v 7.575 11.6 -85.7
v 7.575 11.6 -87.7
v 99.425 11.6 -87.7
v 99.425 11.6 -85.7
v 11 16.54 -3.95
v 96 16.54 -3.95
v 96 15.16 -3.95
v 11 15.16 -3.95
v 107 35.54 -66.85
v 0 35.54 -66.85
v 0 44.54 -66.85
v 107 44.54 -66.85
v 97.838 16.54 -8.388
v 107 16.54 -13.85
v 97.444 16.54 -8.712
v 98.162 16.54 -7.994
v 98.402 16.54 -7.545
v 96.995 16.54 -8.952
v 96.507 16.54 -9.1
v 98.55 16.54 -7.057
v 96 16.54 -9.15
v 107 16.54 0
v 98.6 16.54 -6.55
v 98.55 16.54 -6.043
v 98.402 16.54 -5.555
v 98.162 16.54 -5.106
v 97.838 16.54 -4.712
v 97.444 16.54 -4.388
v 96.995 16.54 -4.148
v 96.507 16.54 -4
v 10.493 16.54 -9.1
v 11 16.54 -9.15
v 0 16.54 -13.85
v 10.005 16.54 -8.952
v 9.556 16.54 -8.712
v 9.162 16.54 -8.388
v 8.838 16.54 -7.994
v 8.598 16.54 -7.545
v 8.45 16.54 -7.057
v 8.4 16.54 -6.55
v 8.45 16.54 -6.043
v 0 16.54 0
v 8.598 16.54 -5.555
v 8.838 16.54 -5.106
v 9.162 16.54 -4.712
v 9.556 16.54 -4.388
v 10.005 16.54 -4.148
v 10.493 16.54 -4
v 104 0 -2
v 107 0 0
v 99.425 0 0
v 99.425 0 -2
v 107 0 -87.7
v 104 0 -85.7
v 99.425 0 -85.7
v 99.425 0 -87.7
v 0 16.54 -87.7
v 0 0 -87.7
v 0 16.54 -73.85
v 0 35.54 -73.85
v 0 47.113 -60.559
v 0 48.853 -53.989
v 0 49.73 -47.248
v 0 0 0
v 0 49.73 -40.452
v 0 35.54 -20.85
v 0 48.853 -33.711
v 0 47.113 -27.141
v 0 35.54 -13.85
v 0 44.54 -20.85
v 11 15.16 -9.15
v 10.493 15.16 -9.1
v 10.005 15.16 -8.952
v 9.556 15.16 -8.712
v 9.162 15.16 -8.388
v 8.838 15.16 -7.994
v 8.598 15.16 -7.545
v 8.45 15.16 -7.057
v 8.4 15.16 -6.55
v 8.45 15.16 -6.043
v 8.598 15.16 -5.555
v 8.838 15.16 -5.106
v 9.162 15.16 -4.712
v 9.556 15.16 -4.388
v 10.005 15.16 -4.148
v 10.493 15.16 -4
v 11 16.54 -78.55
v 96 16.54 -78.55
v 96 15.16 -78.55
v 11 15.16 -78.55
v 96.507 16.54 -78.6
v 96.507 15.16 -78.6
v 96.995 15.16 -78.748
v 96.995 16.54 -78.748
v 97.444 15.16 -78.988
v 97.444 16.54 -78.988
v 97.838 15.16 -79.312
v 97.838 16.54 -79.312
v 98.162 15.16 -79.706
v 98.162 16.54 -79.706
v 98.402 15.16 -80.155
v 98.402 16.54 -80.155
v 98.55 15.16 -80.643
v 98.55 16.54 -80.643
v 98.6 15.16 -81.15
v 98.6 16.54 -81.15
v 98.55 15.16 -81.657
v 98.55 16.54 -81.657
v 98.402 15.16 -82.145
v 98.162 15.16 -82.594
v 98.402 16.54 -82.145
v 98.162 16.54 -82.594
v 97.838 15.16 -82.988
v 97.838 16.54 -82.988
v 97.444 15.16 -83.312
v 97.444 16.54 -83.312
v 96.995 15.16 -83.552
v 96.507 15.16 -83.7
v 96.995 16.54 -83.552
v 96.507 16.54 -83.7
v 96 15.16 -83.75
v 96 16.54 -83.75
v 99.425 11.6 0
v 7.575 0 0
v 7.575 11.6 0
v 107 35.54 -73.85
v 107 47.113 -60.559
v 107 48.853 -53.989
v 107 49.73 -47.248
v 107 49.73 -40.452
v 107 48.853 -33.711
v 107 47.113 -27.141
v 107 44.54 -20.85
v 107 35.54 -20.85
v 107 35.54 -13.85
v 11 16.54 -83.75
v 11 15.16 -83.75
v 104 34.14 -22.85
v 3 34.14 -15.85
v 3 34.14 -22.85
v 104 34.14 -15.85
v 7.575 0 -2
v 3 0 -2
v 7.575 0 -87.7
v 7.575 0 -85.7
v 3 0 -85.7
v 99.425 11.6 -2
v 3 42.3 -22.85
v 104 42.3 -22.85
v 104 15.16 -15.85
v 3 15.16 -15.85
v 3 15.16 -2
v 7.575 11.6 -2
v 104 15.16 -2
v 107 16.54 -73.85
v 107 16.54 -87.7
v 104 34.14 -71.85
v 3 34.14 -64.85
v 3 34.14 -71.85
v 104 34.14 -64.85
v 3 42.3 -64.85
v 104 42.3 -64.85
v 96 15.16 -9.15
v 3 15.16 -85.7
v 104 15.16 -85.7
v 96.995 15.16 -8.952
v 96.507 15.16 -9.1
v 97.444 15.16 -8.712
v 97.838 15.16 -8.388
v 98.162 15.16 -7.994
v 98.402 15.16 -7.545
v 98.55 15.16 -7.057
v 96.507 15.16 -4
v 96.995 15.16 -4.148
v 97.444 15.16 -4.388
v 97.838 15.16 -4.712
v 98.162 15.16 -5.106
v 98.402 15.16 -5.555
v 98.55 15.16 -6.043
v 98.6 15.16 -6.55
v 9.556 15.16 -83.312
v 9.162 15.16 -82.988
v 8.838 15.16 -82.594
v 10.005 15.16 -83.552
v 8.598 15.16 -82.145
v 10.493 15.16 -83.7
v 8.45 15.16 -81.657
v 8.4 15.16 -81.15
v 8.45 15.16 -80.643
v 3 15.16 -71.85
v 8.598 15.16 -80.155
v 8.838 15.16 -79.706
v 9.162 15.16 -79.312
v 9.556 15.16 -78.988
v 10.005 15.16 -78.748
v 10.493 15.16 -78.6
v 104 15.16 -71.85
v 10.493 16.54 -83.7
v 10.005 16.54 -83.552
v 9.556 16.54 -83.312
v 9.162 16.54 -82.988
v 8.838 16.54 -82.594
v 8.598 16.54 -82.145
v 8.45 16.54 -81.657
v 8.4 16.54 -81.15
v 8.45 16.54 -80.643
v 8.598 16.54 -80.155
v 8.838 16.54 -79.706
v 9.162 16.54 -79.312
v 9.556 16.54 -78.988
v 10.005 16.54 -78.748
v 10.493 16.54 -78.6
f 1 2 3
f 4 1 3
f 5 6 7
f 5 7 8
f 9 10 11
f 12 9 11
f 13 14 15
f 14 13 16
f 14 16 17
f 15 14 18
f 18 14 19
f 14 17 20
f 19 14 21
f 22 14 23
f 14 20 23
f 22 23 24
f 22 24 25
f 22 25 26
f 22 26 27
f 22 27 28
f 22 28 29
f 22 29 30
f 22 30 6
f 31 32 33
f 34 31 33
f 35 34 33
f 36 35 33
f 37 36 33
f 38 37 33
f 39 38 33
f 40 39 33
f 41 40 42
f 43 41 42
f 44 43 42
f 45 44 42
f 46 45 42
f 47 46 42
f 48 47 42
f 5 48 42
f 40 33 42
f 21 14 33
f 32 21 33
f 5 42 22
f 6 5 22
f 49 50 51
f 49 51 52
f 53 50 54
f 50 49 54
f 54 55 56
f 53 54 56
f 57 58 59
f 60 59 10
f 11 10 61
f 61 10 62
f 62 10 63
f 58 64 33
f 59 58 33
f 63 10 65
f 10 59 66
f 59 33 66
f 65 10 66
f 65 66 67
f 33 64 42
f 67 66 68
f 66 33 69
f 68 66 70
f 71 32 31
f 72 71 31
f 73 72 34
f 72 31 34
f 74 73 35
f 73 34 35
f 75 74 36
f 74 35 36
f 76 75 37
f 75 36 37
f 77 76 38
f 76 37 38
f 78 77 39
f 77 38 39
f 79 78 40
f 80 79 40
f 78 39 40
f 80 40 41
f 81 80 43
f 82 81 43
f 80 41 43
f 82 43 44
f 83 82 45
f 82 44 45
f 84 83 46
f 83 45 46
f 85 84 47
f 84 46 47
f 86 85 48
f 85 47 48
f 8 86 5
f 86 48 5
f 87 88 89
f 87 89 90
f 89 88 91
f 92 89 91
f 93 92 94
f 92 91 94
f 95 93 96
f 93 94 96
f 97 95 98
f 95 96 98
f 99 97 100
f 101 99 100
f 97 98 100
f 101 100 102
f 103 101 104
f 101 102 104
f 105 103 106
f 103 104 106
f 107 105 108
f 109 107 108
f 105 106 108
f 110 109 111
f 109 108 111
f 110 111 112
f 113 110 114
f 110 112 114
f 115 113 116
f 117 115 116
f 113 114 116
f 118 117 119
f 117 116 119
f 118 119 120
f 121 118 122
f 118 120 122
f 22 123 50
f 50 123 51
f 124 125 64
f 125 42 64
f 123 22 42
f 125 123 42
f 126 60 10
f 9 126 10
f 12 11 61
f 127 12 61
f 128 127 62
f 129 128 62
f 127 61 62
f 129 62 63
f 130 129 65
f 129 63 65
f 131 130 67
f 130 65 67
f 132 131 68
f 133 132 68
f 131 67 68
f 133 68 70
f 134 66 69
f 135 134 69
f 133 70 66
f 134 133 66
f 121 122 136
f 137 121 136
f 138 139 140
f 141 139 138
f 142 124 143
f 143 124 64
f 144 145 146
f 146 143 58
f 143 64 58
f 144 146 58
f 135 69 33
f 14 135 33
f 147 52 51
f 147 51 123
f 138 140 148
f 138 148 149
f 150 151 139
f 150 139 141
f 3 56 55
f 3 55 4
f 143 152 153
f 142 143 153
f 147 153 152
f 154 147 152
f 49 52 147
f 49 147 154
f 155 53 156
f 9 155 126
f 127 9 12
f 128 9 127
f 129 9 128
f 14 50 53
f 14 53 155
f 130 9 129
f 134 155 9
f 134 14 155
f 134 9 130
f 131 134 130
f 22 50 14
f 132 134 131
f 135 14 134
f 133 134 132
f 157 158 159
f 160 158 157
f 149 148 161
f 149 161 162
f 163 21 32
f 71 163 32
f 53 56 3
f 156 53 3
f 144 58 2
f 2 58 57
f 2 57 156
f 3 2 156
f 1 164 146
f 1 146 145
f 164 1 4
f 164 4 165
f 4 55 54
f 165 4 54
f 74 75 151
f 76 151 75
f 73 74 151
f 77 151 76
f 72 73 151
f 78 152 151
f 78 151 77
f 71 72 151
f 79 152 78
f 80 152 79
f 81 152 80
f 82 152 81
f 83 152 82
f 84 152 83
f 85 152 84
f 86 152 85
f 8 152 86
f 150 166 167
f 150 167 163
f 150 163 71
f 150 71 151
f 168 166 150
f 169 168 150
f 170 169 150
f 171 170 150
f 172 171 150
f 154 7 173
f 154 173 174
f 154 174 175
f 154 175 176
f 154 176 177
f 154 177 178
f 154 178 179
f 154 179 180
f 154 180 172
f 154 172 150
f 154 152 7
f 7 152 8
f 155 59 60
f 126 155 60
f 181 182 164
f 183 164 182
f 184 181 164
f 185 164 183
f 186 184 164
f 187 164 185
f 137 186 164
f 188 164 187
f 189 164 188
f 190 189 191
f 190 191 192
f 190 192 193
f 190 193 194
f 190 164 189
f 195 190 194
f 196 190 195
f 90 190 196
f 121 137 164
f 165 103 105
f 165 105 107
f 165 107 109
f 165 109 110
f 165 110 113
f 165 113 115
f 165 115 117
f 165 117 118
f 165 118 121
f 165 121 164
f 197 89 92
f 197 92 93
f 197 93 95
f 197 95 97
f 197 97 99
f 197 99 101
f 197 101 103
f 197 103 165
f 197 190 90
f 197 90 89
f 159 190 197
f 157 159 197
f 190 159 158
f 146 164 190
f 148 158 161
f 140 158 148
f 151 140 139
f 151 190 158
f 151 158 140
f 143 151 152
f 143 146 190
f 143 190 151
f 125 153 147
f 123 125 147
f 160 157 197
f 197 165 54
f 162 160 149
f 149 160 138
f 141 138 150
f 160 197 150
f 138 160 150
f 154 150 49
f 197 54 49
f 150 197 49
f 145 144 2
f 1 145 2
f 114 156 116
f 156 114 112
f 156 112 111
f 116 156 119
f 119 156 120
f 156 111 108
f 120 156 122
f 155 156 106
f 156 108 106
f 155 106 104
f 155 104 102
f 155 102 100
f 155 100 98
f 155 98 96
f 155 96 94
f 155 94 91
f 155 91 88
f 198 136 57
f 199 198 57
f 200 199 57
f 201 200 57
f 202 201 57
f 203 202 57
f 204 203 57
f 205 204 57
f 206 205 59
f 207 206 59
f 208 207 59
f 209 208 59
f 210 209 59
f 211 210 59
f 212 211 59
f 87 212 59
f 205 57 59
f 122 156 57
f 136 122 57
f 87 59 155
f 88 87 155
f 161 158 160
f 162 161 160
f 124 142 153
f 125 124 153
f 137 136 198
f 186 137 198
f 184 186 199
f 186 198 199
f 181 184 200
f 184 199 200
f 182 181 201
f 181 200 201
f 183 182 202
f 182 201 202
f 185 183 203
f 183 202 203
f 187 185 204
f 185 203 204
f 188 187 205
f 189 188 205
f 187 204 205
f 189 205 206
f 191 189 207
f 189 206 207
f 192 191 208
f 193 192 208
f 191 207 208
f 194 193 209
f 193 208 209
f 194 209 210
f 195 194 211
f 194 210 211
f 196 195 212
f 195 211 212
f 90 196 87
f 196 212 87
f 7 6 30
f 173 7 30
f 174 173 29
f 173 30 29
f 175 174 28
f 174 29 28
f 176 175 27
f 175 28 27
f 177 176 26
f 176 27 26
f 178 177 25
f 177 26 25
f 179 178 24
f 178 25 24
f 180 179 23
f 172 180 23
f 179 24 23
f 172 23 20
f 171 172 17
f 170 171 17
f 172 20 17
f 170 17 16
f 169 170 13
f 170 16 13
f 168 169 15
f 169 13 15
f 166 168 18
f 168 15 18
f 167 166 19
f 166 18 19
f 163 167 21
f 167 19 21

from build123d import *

# Parameters (mm, degrees)
PAD_DEPTH       = 107
SKETCH001_W     = 101
SKETCH001_H     = 42
POCKET_DEPTH    = 42.3
SKETCH002_W     = 101
SKETCH002_H     = 56
POCKET001_DEPTH = 34.14
SKETCH003_W     = 101
SKETCH003_H     = 83.7
POCKET002_DEPTH = 15.16
SKETCH004_W     = 11.6
SKETCH004_H     = 91.85
POCKET003_DEPTH = 87.701
POCKET004_DEPTH = 5


with BuildPart() as part:
    # Sketch → Pad (new body)
    with BuildSketch(Plane.YZ):
        with BuildLine():
            Line((0, 0), (0, -87.7))
            Line((0, -87.7), (16.54, -87.7))
            Line((16.54, -87.7), (16.54, -73.85))
            Line((16.54, -73.85), (35.54, -73.85))
            Line((35.54, -73.85), (35.54, -66.85))
            Line((35.54, -66.85), (44.54, -66.85))
            ThreePointArc((44.54, -66.85), (49.84, -43.85), (44.54, -20.85))
            Line((44.54, -20.85), (35.54, -20.85))
            Line((35.54, -20.85), (35.54, -13.85))
            Line((35.54, -13.85), (16.54, -13.85))
            Line((16.54, -13.85), (16.54, 0))
            Line((16.54, 0), (0, 0))
        make_face()
    extrude(amount=PAD_DEPTH)

    # Sketch001 → Pocket (cut)
    with BuildSketch(Plane.XZ):
        with Locations((53.5, -43.85)):
            Rectangle(SKETCH001_W, SKETCH001_H)
    extrude(amount=-POCKET_DEPTH, mode=Mode.SUBTRACT)

    # Sketch002 → Pocket001 (cut)
    with BuildSketch(Plane.XZ):
        with Locations((53.5, -43.85)):
            Rectangle(SKETCH002_W, SKETCH002_H)
    extrude(amount=-POCKET001_DEPTH, mode=Mode.SUBTRACT)

    # Sketch003 → Pocket002 (cut)
    with BuildSketch(Plane.XZ):
        with Locations((53.5, -43.85)):
            Rectangle(SKETCH003_W, SKETCH003_H)
    extrude(amount=-POCKET002_DEPTH, mode=Mode.SUBTRACT)

    # Sketch004 (on Face5 of Pocket002) → Pocket003 (cut, through all)
    with BuildSketch(Plane.YX.offset(87.7)):
        with Locations((5.8, 53.5)):
            Rectangle(SKETCH004_W, SKETCH004_H)
    extrude(amount=-POCKET003_DEPTH, mode=Mode.SUBTRACT)

    # Sketch005 (on Face10 of Pocket003) → Pocket004 (cut)
    with BuildSketch(Plane.ZX.offset(16.54)):
        with BuildLine():
            ThreePointArc((-78.55, 96), (-81.15, 98.6), (-83.75, 96))
            Line((-83.75, 96), (-83.75, 11))
            ThreePointArc((-83.75, 11), (-81.15, 8.4), (-78.55, 11))
            Line((-78.55, 96), (-78.55, 11))
        make_face()
        with BuildLine():
            ThreePointArc((-3.95, 96), (-6.55, 98.6), (-9.15, 96))
            Line((-9.15, 96), (-9.15, 11))
            ThreePointArc((-9.15, 11), (-6.55, 8.4), (-3.95, 11))
            Line((-3.95, 96), (-3.95, 11))
        make_face()
    extrude(amount=-POCKET004_DEPTH, mode=Mode.SUBTRACT)


solid = part.part
